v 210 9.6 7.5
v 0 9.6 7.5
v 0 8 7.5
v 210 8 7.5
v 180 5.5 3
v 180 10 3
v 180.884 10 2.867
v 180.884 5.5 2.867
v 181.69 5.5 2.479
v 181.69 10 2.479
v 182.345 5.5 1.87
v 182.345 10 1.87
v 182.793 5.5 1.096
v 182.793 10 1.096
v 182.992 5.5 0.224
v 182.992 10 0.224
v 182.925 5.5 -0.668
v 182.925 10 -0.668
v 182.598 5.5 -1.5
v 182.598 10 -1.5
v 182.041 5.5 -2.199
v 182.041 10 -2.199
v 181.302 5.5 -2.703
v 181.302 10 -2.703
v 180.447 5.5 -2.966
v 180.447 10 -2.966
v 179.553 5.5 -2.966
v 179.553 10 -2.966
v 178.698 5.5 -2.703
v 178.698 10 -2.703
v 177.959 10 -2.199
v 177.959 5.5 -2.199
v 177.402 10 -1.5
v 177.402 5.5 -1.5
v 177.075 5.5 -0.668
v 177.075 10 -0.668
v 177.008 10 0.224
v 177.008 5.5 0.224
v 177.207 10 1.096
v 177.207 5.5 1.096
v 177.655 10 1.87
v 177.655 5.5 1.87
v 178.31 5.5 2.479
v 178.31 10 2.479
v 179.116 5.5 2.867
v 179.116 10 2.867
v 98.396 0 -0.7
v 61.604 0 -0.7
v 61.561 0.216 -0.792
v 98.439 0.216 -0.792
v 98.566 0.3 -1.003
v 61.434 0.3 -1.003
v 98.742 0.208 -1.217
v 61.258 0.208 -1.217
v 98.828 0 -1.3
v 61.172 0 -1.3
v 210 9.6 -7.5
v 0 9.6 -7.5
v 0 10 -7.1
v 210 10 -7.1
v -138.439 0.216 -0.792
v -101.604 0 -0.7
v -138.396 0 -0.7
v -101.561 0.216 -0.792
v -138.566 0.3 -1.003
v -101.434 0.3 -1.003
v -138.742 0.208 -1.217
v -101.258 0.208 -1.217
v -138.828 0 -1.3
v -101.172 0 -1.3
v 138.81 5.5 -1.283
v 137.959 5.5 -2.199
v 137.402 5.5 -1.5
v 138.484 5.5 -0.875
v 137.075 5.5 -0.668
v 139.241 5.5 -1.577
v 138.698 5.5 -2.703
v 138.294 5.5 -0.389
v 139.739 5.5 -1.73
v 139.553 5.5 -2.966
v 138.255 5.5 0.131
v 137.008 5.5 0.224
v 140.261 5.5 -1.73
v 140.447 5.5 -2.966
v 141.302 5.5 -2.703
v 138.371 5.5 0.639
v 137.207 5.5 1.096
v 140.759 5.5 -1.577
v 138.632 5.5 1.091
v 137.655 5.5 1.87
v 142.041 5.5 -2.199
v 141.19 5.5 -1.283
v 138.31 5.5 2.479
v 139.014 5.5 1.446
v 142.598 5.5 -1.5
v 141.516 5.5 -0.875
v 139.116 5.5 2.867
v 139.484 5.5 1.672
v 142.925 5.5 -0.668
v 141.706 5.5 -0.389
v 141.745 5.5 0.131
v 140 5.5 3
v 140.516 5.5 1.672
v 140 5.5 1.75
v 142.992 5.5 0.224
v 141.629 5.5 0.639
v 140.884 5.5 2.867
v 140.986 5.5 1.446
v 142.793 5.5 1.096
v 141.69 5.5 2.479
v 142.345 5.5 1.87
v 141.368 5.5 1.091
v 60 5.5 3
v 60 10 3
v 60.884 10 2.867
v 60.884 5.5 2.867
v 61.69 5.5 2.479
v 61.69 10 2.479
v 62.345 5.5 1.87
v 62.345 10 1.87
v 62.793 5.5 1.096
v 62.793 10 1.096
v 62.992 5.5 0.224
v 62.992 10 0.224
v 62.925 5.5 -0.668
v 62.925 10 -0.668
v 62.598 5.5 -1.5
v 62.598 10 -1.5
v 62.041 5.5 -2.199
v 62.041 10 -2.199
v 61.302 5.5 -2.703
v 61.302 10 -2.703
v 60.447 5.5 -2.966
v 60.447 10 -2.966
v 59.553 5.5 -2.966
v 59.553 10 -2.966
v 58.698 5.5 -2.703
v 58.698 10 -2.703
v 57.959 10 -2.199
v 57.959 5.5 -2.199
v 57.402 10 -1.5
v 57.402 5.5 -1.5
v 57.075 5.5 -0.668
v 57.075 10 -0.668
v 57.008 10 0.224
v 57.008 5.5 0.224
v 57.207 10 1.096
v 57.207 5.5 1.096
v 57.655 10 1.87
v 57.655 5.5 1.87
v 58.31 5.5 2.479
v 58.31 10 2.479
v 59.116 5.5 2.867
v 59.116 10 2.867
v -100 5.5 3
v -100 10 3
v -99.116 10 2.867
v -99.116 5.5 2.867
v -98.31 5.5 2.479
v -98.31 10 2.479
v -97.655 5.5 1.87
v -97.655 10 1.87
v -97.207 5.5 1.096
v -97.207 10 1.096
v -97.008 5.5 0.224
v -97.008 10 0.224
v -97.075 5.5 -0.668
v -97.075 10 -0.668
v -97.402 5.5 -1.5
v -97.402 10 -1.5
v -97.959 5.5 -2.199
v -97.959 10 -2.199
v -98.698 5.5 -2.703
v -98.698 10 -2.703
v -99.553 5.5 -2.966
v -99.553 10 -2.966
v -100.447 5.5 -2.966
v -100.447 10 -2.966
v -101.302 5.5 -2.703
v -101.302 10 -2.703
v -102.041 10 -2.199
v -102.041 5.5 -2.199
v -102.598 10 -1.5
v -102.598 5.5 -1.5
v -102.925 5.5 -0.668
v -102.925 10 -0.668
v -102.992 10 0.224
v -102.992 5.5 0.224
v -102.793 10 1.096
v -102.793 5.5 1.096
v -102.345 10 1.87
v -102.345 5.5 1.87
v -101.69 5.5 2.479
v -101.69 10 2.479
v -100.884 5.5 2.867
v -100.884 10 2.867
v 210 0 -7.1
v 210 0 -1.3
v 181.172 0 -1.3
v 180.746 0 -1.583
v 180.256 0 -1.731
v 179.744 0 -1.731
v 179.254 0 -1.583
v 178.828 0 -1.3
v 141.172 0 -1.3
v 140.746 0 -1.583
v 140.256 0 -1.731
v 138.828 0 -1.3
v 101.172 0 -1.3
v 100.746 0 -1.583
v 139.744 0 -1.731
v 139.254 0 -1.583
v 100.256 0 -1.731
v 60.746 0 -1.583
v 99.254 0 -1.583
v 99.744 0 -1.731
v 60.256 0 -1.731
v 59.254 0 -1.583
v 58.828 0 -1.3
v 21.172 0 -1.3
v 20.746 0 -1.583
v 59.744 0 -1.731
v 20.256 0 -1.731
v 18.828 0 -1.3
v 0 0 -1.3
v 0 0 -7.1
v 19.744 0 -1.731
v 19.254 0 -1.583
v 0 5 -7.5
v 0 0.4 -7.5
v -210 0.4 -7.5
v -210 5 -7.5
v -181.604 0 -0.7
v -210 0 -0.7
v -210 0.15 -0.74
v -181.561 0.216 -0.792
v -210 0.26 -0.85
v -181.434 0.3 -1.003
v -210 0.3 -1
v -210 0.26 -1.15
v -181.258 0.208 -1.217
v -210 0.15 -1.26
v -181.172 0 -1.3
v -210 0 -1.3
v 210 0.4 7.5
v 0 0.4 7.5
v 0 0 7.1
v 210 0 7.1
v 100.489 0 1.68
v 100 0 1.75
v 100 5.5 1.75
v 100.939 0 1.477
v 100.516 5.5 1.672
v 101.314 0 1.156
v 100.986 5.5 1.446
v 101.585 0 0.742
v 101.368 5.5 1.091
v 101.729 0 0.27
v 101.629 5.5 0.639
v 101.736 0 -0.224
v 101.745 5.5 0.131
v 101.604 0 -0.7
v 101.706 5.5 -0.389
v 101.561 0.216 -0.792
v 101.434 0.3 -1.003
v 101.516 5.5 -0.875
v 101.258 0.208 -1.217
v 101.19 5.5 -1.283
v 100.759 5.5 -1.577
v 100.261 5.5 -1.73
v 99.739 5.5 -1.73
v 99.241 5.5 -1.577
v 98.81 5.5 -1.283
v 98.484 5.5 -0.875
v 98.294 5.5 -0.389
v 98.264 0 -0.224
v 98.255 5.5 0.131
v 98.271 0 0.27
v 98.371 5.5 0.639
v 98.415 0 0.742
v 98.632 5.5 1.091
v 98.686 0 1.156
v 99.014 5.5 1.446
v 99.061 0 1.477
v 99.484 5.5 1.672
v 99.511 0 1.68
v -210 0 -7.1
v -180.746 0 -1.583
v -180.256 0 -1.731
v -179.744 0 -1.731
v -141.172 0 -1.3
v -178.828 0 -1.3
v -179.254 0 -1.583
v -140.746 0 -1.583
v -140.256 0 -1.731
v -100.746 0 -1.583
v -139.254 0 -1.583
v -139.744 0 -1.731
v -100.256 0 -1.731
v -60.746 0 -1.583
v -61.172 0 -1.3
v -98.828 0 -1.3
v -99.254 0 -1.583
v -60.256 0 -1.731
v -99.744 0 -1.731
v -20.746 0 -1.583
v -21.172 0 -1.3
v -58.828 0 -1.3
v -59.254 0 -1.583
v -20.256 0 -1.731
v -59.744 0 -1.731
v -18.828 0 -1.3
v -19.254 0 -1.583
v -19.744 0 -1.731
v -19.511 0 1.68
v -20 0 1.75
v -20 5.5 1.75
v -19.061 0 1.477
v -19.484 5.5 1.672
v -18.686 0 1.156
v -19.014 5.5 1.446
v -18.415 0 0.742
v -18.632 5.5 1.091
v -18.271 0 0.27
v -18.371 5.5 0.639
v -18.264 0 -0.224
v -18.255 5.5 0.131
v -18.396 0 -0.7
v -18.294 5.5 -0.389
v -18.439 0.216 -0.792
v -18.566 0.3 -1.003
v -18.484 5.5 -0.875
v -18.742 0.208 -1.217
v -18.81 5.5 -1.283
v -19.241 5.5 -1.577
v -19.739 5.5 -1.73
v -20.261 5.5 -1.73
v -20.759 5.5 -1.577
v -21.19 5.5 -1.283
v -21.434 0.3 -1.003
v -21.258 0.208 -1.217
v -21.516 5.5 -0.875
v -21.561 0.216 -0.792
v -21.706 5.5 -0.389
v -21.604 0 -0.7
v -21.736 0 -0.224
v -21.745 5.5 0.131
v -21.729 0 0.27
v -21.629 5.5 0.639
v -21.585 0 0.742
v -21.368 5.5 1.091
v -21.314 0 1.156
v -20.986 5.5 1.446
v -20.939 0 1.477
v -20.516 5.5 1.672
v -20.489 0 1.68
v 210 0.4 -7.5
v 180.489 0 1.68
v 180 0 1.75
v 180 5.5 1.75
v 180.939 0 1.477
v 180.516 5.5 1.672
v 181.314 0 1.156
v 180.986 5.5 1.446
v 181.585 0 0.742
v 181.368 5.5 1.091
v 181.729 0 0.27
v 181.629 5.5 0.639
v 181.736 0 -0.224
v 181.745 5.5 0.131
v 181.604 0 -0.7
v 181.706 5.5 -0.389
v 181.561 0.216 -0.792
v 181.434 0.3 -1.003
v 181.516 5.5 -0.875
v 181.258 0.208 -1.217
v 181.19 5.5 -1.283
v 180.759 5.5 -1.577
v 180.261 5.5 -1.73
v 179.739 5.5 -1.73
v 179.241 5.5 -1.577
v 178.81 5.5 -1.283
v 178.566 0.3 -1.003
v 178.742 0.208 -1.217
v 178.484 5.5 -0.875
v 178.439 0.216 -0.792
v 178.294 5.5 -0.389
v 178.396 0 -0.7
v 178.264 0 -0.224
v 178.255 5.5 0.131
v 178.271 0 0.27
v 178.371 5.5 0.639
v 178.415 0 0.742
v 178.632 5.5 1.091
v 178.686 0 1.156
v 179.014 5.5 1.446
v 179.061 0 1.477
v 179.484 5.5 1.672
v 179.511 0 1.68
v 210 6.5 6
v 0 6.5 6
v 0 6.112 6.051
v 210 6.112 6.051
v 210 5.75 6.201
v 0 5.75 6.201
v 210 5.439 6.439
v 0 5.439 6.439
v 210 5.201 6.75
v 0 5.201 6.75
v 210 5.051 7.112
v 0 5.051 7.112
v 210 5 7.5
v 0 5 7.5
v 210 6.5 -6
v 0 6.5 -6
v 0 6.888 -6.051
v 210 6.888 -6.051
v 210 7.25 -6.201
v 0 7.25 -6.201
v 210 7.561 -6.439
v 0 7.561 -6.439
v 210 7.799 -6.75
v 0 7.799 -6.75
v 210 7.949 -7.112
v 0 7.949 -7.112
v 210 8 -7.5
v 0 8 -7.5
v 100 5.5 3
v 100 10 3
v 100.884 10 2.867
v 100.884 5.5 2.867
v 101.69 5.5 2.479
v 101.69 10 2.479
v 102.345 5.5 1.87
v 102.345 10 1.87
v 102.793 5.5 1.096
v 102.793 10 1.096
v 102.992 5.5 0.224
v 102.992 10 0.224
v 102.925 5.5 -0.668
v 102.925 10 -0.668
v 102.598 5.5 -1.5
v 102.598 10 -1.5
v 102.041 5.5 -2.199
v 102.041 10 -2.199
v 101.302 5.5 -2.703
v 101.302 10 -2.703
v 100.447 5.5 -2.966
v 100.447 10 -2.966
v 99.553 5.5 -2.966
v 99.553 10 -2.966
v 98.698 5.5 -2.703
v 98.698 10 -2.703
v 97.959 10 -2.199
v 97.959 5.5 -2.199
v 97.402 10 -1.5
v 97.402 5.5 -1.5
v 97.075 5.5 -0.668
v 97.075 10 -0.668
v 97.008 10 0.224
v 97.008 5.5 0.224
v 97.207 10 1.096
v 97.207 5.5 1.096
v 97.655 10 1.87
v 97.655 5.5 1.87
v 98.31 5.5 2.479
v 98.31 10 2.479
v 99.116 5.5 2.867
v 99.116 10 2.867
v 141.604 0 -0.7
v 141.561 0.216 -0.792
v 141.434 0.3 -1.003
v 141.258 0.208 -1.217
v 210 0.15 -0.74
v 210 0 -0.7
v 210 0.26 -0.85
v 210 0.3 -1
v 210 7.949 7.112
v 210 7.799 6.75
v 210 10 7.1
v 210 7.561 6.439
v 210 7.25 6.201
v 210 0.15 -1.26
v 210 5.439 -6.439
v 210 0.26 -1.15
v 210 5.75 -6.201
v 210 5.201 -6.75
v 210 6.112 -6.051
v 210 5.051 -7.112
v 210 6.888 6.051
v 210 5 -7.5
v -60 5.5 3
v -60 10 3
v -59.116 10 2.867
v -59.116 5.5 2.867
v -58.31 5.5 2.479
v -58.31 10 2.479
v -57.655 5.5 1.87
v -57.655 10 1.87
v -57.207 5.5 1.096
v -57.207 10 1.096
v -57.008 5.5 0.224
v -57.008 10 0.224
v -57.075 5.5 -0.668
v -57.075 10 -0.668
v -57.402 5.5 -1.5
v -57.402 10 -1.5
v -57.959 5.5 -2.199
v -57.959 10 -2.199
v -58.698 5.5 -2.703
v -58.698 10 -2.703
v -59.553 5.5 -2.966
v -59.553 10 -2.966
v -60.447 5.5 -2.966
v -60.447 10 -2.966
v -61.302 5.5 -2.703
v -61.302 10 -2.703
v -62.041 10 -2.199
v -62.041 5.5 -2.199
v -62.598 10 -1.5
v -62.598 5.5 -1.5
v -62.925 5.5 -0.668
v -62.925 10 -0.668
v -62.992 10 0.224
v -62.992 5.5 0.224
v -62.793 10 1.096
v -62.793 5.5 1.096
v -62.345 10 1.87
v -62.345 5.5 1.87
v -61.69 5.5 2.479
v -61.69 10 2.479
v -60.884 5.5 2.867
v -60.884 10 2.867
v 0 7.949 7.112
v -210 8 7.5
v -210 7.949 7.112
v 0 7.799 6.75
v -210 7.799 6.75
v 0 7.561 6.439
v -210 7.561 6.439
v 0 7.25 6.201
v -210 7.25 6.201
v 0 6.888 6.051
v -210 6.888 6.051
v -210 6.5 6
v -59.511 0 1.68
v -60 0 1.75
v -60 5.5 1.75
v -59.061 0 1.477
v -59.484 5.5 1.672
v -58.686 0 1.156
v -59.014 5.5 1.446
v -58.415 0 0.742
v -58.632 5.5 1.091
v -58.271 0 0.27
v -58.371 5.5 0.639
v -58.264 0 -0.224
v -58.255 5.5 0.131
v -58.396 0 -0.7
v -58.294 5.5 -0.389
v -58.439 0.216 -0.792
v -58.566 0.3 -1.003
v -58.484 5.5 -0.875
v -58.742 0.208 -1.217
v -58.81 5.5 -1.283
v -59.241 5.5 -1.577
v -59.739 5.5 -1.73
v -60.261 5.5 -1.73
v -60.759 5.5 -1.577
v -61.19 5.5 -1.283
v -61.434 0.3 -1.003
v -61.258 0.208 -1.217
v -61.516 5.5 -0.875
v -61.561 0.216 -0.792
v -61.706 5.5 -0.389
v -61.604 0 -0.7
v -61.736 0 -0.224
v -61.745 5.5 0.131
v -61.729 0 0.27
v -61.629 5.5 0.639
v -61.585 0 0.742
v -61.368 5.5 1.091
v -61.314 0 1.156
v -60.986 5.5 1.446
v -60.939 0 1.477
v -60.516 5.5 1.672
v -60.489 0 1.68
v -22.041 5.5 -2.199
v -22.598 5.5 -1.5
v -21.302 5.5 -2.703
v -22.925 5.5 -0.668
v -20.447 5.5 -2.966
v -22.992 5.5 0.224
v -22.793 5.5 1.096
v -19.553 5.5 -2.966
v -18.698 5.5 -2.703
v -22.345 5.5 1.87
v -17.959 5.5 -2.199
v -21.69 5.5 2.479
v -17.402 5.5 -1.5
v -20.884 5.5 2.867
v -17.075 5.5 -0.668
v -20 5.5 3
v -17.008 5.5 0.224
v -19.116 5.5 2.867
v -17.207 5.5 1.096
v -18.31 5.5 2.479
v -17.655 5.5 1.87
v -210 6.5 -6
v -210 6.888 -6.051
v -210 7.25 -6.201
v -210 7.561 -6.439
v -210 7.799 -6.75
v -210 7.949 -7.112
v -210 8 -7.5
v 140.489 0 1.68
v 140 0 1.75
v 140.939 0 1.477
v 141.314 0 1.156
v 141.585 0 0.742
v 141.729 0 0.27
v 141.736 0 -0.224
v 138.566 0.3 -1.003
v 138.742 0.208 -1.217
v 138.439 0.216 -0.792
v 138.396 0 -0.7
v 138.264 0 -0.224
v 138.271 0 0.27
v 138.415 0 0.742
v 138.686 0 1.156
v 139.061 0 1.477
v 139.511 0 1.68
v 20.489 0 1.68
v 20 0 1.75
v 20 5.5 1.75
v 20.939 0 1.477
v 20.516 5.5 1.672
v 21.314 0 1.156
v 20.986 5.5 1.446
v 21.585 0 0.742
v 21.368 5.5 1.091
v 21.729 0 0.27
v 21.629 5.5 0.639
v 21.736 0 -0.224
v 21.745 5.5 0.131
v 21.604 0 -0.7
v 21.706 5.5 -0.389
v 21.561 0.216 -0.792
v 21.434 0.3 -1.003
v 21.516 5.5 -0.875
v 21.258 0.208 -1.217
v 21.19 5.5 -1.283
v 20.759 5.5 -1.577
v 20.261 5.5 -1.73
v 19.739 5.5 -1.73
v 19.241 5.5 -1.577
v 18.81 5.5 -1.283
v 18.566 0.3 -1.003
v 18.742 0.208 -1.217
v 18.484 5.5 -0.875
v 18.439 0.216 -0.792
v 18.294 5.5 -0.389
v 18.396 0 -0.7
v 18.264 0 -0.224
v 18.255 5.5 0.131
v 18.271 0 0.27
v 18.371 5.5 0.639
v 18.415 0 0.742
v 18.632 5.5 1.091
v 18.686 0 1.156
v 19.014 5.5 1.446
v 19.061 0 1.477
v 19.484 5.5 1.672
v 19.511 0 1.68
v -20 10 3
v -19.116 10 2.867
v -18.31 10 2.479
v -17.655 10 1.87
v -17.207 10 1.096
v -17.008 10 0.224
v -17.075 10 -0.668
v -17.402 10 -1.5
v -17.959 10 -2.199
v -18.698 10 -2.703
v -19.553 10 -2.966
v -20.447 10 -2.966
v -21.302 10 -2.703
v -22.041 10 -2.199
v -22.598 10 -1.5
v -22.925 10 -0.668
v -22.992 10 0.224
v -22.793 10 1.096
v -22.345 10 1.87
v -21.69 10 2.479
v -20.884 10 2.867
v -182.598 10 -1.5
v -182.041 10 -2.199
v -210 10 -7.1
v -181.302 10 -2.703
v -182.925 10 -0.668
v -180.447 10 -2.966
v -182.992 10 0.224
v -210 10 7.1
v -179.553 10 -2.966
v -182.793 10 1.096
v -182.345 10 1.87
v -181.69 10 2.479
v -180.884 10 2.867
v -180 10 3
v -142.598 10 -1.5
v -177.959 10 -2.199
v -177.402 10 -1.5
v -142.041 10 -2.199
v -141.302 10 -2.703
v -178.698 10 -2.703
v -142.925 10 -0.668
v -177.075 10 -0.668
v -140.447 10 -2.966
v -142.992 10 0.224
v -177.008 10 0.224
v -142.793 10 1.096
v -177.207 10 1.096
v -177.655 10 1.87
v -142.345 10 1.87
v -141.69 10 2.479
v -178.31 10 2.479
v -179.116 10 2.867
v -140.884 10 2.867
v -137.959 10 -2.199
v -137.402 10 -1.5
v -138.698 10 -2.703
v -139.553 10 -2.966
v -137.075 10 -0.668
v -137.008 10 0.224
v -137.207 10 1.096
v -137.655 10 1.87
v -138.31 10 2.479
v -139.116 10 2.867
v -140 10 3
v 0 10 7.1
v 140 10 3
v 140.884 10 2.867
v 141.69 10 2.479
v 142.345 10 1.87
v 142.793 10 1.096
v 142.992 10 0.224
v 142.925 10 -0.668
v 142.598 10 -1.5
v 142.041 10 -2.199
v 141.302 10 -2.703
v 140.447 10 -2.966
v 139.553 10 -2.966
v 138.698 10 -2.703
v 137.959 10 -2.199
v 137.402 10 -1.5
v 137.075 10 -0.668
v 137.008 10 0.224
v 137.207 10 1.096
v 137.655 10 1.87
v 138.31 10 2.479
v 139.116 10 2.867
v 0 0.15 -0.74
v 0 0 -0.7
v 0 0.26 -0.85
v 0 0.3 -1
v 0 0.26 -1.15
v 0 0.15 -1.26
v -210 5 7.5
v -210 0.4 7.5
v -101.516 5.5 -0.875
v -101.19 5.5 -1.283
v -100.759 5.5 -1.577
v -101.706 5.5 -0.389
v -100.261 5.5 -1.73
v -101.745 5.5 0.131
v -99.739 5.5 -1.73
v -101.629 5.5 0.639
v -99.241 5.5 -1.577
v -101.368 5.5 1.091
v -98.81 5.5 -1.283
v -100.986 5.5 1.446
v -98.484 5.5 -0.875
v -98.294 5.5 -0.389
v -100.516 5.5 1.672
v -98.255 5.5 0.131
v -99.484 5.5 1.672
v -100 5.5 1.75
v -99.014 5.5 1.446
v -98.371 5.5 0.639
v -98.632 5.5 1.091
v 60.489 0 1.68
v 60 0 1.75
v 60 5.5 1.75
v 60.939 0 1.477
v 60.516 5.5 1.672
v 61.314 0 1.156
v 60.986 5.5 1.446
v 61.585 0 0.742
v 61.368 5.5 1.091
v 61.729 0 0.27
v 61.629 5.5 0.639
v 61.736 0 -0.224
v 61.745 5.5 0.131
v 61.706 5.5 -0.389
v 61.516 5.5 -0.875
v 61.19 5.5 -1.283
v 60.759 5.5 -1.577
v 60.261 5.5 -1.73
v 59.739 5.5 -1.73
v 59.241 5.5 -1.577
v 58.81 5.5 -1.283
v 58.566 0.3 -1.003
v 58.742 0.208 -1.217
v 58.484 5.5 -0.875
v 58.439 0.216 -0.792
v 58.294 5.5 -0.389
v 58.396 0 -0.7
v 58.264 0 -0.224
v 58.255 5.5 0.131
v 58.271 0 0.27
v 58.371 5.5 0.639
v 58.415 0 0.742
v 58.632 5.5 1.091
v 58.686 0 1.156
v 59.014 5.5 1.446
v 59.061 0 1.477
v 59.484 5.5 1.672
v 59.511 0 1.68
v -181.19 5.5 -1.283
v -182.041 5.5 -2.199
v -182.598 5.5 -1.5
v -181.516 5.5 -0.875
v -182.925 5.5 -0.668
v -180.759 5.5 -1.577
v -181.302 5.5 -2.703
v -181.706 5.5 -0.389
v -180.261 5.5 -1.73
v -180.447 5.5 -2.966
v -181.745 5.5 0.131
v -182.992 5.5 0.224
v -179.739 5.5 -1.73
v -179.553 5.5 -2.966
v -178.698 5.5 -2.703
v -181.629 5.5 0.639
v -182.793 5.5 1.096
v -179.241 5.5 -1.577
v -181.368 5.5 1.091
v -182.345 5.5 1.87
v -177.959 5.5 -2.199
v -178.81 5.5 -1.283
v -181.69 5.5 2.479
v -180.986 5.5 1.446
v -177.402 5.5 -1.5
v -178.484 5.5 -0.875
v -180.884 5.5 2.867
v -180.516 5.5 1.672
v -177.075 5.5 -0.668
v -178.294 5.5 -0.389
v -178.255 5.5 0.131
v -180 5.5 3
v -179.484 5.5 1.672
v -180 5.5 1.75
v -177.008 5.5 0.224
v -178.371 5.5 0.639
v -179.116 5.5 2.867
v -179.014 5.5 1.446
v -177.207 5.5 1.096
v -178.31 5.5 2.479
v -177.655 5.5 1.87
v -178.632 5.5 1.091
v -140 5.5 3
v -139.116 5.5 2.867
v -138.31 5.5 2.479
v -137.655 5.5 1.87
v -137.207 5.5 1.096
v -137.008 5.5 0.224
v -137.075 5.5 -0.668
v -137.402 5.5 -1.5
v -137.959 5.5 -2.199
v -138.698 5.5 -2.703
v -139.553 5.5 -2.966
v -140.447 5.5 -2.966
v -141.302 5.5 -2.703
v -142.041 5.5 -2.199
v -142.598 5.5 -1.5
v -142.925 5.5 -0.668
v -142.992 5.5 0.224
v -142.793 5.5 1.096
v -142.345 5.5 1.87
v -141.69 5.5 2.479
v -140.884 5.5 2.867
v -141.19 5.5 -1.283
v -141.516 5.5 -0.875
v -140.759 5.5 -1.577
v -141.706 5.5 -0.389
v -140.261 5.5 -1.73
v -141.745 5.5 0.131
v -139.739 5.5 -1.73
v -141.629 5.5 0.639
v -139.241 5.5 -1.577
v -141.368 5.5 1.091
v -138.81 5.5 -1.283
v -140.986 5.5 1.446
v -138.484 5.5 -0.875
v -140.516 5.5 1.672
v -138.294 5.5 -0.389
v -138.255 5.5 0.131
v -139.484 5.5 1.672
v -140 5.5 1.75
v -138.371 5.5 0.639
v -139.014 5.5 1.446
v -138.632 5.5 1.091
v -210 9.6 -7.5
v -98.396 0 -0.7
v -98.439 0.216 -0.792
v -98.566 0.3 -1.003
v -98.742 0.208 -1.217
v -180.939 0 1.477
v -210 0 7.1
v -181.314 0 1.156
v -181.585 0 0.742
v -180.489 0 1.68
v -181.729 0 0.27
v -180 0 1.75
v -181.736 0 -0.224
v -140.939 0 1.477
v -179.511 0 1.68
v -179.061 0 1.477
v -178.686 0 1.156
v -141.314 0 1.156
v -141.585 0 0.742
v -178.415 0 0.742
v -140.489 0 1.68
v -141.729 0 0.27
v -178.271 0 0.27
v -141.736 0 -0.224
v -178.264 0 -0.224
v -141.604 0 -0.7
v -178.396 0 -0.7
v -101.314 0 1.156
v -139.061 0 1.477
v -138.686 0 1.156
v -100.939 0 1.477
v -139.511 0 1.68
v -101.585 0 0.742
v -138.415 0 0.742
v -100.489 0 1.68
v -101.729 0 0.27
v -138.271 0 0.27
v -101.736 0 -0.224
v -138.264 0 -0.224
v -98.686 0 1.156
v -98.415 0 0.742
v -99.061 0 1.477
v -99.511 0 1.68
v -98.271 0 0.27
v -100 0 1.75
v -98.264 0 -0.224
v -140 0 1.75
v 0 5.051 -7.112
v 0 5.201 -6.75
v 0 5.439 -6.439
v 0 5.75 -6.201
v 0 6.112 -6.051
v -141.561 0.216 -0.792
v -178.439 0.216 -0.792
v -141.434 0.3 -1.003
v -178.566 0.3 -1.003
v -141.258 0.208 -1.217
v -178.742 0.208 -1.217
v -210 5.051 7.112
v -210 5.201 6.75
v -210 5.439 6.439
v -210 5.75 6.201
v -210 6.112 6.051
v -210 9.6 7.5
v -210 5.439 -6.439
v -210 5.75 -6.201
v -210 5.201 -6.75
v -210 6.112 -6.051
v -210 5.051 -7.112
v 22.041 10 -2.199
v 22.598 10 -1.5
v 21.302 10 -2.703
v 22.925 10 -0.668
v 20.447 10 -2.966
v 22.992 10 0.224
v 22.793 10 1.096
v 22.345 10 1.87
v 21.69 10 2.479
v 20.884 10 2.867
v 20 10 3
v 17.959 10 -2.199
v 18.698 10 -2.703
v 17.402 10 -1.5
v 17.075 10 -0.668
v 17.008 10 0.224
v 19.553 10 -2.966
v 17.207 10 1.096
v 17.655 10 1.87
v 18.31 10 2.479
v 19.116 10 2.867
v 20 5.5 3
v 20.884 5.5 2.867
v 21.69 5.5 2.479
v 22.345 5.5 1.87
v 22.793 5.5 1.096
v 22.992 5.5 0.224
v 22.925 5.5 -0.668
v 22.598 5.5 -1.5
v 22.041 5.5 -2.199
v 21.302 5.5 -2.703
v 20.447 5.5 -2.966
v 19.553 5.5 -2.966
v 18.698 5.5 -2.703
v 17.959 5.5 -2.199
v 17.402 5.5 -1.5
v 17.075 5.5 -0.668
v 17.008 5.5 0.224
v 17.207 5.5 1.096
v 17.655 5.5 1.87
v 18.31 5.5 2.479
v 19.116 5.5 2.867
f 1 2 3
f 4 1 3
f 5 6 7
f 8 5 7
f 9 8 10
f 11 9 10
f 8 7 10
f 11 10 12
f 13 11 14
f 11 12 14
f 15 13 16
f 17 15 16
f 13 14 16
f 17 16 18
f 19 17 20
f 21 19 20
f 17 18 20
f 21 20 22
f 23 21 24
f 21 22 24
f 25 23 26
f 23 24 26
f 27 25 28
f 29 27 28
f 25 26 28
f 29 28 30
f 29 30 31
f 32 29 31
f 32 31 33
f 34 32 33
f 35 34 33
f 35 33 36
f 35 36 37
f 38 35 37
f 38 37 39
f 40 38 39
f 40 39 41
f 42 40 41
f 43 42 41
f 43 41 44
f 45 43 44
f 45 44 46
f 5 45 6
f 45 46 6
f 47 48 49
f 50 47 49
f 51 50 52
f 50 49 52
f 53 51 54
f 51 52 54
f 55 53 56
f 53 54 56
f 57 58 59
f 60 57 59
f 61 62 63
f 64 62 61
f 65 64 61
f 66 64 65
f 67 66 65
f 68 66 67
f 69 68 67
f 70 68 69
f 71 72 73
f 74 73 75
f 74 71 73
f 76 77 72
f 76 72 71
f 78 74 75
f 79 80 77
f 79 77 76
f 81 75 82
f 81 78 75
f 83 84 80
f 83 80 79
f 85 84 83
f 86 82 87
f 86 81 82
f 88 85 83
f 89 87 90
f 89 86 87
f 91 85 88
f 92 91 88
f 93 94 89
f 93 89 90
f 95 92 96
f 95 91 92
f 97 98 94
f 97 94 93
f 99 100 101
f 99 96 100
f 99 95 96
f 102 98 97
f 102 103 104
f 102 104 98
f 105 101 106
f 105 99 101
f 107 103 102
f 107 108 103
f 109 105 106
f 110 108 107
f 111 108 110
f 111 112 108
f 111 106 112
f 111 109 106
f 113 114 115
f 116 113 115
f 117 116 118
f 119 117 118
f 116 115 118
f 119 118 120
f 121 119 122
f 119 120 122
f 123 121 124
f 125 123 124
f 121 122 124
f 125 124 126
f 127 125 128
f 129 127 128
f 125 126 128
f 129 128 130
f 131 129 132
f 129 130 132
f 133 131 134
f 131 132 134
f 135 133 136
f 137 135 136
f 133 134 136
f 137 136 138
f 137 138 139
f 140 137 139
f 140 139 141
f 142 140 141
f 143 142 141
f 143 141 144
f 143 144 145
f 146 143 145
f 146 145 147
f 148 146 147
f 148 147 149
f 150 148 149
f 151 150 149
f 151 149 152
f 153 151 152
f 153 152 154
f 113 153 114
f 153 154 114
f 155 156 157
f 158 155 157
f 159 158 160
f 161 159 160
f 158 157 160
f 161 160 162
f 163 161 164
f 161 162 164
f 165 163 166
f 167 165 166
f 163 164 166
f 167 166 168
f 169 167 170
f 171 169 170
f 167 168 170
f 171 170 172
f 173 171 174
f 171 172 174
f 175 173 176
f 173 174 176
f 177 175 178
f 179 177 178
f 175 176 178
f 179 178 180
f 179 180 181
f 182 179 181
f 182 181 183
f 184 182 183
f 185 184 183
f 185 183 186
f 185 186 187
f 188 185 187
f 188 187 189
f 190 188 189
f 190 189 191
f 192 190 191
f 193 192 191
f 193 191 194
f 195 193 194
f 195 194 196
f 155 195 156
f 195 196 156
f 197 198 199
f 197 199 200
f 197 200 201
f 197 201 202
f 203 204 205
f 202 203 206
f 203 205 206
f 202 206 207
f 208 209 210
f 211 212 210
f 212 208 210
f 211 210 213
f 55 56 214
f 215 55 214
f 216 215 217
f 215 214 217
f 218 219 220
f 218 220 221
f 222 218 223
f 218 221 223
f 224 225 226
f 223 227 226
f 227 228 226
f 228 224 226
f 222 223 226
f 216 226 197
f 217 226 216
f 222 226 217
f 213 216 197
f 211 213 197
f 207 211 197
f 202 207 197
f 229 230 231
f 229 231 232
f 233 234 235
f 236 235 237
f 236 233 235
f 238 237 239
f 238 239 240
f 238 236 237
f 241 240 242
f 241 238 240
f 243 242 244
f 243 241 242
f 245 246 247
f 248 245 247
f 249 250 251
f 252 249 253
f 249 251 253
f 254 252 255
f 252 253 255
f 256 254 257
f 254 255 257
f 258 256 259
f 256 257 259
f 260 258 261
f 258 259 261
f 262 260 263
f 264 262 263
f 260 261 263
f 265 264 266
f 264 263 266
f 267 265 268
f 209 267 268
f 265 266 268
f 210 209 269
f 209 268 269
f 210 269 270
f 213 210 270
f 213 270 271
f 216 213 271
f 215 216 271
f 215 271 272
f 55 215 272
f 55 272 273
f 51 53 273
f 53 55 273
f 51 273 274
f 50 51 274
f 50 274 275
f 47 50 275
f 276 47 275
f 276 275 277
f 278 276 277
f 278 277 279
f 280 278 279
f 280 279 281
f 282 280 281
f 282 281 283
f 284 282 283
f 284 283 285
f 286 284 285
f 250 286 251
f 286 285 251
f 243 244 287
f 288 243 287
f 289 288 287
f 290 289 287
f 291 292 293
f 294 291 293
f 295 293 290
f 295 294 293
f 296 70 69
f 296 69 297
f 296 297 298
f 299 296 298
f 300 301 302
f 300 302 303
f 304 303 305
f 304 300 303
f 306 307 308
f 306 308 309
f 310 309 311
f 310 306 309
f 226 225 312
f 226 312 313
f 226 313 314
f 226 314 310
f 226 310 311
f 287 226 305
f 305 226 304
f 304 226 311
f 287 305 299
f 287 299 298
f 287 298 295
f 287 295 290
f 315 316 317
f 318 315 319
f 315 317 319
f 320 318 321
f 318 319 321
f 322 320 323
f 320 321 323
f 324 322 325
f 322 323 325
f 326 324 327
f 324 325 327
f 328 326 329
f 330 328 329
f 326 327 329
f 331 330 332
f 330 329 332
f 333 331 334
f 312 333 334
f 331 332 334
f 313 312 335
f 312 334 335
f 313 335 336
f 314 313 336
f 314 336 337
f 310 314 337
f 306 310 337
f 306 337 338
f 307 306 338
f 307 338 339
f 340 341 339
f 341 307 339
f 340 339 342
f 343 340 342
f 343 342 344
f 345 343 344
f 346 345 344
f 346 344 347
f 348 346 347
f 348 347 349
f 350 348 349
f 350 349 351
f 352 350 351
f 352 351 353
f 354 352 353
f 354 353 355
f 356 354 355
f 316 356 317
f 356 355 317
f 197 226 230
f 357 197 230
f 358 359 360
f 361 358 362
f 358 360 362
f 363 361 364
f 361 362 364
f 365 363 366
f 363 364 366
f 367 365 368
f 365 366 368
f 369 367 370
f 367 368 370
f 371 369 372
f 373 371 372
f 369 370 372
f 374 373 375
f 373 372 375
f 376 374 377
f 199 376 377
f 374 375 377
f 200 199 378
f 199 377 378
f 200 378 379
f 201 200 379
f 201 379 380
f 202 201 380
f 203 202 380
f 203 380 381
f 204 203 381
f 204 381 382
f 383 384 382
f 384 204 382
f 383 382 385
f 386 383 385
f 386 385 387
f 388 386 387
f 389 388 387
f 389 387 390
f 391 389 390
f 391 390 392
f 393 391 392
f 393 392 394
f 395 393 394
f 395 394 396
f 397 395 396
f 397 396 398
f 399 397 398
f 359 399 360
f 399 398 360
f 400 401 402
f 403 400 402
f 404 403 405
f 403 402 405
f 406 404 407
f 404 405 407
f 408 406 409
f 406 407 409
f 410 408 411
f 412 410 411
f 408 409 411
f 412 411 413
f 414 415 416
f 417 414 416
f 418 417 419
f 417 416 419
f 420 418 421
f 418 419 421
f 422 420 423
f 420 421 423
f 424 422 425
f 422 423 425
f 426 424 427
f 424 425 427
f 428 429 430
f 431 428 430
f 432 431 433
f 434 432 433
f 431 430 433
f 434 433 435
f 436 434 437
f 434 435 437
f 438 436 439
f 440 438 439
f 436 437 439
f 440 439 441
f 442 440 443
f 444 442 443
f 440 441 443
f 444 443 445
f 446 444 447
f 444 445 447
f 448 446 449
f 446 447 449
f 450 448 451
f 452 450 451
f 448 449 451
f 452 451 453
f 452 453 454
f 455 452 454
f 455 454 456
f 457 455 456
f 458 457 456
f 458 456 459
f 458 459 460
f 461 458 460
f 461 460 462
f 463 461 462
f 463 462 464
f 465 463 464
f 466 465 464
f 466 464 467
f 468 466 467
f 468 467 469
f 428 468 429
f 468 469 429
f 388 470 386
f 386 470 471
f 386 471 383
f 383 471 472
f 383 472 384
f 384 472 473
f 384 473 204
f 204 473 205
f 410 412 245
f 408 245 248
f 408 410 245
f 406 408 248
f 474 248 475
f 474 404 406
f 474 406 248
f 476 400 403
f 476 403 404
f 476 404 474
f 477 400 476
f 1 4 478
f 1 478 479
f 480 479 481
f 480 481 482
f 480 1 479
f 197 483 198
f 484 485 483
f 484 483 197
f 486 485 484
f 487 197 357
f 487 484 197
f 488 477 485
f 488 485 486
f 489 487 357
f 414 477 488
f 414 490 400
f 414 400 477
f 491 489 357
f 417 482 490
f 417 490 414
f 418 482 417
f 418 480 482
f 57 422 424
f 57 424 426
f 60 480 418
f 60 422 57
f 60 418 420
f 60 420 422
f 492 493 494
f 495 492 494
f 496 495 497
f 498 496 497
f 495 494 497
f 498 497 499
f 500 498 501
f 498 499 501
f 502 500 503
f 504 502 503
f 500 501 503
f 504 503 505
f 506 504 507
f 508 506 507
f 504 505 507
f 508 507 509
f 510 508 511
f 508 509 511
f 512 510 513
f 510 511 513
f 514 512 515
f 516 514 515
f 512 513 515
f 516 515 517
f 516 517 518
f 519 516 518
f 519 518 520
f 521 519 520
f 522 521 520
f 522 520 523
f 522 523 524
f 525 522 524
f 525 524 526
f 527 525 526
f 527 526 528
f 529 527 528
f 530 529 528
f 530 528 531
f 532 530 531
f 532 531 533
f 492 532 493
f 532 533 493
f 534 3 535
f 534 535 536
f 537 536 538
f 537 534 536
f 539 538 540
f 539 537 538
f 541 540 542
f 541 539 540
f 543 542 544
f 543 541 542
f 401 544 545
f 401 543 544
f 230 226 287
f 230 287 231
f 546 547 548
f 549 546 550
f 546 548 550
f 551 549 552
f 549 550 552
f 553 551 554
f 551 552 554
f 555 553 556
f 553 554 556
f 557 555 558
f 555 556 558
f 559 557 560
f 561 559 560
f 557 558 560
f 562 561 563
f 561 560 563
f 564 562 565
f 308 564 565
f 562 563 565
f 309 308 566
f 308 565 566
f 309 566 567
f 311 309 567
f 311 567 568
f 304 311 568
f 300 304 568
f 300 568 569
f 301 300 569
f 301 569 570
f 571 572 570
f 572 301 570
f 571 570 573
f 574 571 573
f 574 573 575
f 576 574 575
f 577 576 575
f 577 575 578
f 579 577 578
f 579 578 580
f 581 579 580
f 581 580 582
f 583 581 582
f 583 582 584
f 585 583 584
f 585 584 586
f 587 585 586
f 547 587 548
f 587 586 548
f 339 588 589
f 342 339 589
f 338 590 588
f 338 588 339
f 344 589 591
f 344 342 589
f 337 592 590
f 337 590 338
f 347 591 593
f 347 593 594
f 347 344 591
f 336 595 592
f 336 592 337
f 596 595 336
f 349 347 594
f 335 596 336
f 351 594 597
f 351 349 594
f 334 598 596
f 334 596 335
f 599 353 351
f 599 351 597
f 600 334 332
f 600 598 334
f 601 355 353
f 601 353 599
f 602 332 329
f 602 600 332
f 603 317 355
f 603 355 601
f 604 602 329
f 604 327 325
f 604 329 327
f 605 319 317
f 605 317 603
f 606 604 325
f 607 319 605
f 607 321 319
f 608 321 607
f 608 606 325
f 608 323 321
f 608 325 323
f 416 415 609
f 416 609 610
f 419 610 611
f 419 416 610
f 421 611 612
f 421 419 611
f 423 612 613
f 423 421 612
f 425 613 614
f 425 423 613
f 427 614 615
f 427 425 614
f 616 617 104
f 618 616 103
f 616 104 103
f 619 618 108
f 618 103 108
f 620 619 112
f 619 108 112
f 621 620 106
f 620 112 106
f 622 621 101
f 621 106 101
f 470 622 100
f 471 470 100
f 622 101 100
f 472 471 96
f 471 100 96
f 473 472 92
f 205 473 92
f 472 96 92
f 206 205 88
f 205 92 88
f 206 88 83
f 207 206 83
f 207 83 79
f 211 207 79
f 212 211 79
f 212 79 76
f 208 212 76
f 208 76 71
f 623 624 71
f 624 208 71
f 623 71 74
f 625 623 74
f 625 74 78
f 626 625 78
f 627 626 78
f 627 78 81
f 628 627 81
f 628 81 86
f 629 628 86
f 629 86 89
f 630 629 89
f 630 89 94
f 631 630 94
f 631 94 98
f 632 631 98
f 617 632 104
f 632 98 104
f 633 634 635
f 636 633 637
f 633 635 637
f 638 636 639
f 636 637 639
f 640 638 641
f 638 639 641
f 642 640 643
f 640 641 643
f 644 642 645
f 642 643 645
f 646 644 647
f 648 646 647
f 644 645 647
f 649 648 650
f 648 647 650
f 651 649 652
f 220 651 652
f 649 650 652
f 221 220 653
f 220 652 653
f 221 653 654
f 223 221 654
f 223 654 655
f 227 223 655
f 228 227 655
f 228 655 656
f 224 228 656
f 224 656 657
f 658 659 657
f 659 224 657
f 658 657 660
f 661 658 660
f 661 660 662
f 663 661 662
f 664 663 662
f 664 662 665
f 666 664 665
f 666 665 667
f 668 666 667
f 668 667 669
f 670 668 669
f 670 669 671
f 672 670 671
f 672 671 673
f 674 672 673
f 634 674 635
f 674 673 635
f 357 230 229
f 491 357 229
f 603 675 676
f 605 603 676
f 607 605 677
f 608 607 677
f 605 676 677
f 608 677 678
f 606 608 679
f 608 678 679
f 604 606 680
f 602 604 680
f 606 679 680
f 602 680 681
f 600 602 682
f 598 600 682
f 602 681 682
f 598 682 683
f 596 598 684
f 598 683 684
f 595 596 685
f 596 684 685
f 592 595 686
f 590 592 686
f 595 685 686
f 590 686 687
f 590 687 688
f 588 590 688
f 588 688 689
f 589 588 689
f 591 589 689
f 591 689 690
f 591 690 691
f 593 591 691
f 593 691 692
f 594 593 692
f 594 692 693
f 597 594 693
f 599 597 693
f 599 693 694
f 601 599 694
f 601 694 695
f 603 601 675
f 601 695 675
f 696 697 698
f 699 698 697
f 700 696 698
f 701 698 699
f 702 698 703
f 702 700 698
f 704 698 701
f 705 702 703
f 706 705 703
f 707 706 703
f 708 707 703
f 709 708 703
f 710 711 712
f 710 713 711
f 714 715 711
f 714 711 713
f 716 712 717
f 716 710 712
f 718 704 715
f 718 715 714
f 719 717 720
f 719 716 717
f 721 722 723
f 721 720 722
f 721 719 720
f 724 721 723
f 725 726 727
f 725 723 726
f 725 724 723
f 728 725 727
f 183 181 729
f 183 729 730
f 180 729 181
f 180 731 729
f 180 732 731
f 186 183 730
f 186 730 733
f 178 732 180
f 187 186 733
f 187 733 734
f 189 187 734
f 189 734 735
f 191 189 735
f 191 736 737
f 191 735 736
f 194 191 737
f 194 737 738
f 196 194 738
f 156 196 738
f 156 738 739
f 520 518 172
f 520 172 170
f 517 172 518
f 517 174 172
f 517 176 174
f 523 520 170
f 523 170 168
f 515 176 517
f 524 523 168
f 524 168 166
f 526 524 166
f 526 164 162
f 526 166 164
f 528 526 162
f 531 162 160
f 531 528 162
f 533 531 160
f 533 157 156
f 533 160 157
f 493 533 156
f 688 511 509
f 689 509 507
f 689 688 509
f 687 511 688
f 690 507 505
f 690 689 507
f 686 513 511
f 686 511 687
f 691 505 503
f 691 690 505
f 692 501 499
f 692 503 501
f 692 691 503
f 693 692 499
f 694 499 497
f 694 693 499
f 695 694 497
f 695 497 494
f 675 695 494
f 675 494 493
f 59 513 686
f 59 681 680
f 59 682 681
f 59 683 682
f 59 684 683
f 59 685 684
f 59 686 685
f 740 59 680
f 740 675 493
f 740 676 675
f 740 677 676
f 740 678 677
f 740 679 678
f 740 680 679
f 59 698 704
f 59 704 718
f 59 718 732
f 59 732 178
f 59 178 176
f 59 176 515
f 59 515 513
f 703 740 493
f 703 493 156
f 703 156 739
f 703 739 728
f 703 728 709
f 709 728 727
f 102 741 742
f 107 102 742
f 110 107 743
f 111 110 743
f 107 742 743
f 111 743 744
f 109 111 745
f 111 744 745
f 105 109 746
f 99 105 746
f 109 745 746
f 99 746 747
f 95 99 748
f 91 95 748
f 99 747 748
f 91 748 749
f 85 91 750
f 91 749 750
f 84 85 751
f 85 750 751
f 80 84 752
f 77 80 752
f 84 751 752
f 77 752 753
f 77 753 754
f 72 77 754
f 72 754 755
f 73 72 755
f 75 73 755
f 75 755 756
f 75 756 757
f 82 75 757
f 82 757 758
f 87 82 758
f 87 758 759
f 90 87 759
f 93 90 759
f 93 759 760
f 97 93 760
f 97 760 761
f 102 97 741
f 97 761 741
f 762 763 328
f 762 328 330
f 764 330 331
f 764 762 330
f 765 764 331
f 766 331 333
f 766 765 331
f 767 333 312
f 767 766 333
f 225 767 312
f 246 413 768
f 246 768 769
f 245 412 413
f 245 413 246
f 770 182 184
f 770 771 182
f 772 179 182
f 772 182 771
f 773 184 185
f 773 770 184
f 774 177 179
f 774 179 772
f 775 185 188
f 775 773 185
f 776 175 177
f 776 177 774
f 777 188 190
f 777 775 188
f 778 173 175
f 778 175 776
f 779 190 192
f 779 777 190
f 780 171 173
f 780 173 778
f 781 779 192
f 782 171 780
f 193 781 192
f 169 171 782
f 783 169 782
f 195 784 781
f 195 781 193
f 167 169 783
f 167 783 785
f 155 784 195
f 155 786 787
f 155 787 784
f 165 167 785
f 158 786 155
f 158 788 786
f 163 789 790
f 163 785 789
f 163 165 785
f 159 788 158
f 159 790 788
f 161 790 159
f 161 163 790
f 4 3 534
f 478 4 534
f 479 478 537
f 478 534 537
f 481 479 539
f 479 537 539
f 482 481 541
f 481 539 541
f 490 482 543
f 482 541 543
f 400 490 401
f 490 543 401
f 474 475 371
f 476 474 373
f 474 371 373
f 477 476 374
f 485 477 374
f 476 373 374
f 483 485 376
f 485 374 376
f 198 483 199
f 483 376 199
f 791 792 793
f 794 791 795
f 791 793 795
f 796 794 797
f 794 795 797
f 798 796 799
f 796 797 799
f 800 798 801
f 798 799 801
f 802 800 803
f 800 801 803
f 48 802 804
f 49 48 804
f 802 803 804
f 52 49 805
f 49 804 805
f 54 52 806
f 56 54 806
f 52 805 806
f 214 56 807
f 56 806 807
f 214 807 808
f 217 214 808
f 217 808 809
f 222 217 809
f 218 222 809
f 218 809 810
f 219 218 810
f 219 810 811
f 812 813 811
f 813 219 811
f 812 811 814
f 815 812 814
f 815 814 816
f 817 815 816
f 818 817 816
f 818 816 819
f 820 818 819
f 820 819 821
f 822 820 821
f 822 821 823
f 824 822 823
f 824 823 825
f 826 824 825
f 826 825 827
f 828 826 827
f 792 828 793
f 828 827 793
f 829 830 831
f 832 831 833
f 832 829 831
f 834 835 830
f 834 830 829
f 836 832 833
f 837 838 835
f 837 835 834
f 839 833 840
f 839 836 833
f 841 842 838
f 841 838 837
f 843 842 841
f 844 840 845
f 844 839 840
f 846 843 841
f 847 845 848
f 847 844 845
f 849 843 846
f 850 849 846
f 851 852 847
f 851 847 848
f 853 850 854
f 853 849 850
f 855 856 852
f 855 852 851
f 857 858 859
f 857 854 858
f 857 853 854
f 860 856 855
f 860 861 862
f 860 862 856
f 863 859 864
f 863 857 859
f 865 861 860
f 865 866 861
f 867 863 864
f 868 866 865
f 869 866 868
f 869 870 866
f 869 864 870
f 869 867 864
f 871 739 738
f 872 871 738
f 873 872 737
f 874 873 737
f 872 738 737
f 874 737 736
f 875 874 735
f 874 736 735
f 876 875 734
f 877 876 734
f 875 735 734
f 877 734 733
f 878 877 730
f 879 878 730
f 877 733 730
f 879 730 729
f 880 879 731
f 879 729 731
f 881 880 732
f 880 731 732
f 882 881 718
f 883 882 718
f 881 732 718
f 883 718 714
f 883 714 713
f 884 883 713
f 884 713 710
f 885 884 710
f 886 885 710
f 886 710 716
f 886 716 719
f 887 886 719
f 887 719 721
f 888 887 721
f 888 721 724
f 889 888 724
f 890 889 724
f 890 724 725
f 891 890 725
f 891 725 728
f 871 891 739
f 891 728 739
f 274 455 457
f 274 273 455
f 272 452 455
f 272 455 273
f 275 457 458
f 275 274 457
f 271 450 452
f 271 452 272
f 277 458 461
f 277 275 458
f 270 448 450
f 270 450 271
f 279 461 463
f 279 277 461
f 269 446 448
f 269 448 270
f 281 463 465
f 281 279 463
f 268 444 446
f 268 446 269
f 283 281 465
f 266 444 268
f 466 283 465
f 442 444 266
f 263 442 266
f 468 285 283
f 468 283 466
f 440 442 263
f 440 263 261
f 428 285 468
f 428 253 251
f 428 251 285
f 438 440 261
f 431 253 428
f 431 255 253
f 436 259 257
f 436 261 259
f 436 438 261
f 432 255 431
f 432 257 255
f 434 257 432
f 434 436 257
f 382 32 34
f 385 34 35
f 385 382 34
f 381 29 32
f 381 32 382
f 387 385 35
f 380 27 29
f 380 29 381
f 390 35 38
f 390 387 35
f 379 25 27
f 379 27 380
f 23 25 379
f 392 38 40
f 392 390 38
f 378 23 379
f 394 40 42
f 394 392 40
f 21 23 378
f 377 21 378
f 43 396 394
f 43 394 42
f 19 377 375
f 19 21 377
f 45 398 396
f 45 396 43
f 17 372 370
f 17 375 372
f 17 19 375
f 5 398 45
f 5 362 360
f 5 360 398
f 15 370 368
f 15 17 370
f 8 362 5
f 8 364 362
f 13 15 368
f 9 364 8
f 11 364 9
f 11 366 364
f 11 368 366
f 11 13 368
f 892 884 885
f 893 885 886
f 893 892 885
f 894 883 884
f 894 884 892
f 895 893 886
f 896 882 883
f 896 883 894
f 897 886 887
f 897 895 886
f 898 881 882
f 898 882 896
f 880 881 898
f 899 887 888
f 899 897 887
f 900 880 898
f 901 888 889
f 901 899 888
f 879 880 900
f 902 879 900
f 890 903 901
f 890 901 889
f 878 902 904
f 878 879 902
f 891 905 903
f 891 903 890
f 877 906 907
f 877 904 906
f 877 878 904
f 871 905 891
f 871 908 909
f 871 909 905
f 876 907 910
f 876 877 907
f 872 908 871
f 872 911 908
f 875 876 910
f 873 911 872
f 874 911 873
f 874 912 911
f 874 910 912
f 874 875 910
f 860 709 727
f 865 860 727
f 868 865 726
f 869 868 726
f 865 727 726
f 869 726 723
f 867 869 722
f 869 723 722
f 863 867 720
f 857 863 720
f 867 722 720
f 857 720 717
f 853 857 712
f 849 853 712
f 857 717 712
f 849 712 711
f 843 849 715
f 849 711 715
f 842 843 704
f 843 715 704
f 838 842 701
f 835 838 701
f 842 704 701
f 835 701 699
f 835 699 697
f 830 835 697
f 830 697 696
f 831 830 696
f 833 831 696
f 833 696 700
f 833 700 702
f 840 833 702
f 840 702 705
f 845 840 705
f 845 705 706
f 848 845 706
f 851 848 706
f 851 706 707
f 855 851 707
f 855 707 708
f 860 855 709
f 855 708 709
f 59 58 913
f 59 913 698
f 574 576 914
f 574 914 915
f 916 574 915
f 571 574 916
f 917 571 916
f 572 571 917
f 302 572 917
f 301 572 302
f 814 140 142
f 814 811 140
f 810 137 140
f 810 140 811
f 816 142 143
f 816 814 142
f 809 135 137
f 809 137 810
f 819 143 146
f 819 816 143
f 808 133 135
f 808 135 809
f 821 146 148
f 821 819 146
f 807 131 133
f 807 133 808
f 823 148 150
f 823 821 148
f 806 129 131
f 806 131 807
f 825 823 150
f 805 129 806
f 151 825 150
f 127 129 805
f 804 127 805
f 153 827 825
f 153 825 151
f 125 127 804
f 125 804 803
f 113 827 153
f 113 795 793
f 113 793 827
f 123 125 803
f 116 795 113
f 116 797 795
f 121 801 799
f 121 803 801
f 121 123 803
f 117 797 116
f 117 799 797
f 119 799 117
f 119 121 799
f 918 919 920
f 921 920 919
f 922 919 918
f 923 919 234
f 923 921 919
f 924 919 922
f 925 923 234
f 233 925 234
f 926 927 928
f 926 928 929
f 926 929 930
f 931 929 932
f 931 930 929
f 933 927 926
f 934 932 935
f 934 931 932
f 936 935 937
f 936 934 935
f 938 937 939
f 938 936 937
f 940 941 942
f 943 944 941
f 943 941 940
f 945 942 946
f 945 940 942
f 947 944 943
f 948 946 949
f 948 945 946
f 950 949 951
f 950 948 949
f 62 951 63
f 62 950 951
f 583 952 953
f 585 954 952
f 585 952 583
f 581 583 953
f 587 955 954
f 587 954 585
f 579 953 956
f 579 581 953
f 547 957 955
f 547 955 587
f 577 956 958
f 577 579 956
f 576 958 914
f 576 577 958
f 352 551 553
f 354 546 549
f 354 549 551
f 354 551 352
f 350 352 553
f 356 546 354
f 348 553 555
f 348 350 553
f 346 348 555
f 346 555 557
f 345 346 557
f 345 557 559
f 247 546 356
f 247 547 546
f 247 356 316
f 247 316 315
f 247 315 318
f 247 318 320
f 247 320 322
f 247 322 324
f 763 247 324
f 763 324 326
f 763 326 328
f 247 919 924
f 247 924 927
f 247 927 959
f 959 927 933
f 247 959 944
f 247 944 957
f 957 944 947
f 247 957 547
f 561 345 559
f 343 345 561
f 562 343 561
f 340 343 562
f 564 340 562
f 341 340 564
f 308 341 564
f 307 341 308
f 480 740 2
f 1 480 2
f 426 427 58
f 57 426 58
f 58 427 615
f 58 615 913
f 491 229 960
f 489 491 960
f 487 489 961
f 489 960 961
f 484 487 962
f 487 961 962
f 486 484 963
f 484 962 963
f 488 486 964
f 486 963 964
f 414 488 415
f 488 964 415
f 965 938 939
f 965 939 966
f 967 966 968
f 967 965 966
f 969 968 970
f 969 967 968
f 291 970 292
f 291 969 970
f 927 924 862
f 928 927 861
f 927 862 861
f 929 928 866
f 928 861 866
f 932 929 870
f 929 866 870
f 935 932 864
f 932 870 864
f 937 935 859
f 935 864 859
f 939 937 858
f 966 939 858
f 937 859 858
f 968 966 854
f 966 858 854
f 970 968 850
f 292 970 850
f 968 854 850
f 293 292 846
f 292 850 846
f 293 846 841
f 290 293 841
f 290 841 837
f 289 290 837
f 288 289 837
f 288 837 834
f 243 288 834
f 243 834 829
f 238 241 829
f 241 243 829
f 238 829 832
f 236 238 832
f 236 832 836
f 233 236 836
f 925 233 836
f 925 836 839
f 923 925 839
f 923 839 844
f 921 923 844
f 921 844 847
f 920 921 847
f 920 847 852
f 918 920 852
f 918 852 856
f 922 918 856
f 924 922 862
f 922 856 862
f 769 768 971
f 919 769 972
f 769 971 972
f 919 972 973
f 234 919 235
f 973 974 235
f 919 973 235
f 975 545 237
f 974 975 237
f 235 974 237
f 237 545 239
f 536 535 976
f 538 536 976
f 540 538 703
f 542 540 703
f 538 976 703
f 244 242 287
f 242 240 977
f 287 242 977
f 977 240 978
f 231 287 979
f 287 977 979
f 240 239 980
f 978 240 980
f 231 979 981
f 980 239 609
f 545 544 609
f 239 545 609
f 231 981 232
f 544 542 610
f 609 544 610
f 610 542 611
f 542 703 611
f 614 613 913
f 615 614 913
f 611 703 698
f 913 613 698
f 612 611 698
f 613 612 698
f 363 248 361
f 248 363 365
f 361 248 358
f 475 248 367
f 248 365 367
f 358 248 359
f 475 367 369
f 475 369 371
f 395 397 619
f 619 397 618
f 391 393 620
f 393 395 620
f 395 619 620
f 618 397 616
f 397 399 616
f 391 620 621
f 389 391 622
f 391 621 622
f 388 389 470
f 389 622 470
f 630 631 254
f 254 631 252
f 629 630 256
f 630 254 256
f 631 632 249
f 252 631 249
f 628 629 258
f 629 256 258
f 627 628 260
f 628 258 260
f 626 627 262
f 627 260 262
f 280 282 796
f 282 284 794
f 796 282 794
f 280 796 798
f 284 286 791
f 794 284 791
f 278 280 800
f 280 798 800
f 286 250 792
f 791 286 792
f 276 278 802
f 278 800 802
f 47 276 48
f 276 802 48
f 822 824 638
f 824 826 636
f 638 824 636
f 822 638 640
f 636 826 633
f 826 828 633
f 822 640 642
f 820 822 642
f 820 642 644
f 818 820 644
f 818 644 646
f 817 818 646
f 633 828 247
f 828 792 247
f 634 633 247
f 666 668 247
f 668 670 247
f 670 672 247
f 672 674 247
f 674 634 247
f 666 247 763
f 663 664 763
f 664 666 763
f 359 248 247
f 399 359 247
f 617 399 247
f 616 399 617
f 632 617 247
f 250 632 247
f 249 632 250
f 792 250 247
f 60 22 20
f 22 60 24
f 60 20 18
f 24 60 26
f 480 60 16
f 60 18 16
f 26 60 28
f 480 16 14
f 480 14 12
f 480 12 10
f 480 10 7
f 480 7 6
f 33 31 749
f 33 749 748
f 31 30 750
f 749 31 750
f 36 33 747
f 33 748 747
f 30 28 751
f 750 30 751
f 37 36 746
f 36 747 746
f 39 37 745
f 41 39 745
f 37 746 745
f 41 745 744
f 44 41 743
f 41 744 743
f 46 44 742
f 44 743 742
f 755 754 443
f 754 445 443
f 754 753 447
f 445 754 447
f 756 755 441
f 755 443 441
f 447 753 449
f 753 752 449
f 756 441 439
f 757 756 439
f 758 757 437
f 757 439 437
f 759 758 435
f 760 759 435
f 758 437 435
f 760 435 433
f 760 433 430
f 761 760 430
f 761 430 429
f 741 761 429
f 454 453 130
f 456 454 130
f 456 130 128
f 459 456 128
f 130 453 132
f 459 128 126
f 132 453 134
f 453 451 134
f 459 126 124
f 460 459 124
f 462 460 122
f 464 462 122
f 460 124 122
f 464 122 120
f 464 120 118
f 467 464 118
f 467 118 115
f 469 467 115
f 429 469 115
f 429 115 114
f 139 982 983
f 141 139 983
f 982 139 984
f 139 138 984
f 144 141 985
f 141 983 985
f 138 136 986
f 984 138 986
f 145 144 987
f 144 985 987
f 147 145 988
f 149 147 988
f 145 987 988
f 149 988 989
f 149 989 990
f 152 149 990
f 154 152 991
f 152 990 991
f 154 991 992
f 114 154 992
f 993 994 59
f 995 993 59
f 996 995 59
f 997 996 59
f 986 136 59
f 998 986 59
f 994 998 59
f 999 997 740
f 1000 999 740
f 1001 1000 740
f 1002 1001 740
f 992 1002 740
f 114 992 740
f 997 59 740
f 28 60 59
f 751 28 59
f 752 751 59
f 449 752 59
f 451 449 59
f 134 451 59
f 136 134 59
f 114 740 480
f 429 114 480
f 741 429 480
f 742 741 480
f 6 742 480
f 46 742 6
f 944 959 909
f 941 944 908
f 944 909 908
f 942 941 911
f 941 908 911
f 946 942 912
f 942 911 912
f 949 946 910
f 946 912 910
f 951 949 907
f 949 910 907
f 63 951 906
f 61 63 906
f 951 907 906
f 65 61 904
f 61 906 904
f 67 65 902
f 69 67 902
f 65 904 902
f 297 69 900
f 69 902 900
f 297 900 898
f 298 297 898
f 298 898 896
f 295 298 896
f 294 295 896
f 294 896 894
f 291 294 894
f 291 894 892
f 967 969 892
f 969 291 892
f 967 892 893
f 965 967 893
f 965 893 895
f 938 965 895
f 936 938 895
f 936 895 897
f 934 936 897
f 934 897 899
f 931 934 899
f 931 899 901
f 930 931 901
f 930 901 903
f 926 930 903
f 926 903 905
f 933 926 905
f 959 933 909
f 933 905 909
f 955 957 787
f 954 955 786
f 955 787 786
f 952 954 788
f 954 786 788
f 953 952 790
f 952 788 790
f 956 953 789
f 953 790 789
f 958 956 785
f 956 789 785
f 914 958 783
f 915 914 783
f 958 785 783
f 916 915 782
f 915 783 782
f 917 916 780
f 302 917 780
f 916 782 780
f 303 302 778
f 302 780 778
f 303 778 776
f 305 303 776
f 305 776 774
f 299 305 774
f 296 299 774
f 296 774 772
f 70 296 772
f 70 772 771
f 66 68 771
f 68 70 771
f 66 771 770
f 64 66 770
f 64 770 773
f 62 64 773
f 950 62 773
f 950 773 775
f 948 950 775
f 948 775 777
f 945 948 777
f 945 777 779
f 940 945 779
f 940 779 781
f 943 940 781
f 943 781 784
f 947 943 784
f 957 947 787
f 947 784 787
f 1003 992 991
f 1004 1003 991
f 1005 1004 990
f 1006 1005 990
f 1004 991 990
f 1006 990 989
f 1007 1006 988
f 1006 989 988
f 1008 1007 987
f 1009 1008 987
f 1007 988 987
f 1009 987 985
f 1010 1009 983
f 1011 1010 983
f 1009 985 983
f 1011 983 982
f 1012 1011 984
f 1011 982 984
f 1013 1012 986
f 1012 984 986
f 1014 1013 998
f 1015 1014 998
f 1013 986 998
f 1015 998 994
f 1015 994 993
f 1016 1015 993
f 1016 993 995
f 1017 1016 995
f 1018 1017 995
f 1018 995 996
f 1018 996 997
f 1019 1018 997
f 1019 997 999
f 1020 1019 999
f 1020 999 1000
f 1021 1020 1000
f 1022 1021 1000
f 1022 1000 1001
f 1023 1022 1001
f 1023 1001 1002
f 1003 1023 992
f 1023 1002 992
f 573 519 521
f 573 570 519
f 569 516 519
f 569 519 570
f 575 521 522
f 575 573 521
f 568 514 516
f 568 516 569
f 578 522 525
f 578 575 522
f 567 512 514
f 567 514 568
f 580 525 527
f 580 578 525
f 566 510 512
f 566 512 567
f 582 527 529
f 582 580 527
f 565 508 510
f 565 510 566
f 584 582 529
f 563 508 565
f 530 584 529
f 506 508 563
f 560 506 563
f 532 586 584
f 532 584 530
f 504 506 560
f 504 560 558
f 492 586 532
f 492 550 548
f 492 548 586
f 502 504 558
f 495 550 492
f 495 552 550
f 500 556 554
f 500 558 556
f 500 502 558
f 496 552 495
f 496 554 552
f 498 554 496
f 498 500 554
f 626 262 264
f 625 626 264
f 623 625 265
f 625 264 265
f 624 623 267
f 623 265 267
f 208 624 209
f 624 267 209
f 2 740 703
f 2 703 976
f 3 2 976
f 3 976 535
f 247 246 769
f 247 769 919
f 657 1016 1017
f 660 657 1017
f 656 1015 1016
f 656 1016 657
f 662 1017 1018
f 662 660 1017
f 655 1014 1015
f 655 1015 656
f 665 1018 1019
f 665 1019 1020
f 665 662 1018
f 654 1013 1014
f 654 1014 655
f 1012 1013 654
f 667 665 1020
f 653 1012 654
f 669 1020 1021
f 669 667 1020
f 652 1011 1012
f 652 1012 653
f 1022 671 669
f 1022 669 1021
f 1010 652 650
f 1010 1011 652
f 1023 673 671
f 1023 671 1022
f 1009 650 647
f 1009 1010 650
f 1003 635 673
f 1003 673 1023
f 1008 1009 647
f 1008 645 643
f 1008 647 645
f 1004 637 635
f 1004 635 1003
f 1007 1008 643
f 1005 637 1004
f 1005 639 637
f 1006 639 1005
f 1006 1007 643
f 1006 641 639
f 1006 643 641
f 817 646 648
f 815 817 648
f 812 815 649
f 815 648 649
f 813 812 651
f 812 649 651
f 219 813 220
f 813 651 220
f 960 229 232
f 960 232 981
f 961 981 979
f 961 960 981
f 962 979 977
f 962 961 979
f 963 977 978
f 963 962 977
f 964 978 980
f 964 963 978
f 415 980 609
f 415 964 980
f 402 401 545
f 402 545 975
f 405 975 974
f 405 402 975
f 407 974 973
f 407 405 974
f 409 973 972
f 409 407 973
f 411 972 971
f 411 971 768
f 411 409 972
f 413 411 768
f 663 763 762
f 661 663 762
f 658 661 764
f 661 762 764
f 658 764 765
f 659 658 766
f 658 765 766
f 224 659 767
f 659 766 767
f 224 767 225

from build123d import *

# Parameters (mm, degrees)
EXTRUDE_1_DEPTH        = 210
SKETCH_2_R             = 3
CUT_EXTRUDE_1_DEPTH    = 4.5
SKETCH_4_R             = 1.75
CUT_EXTRUDE_2_DEPTH    = 211.205851488
PATTERN_LINEAR_1_COUNT = 15
PATTERN_LINEAR_1_PITCH = 40


with BuildPart() as part:
    # 草图1 → 凸台-拉伸1 (new, symmetric)
    with BuildSketch(Plane(origin=(0, 0, 0), x_dir=(0, 0, -1), z_dir=(1, 0, 0))):
        with BuildLine():
            Line((-7.5, 5), (-7.5, 0.4))
            Line((-7.5, 0.4), (-7.1, 0))
            Line((-7.1, 0), (0.7, 0))
            ThreePointArc((0.7, 0), (1, 0.3), (1.3, 0))
            Line((1.3, 0), (7.1, 0))
            Line((7.1, 0), (7.5, 0.4))
            Line((7.5, 0.4), (7.5, 5))
            ThreePointArc((7.5, 5), (6.439339828, 5.439339828), (6, 6.5))
            ThreePointArc((6, 6.5), (6.439339828, 7.560660172), (7.5, 8))
            Line((7.5, 8), (7.5, 9.6))
            Line((7.5, 9.6), (7.1, 10))
            Line((7.1, 10), (-7.1, 10))
            Line((-7.1, 10), (-7.5, 9.6))
            Line((-7.5, 9.6), (-7.5, 8))
            ThreePointArc((-7.5, 8), (-6.439339823, 7.560660166), (-6, 6.499999984))
            ThreePointArc((-6, 6.499999984), (-6.439339834, 5.439339823), (-7.5, 5))
        make_face()
    extrude(amount=EXTRUDE_1_DEPTH, both=True)

    # 草图2 → 切除-拉伸1 (cut)
    with BuildSketch(Plane(origin=(0, 10, 0), x_dir=(1, 0, 0), z_dir=(0, 1, 0))):
        with Locations(Location((-180, 0, 0), (0, 0, 270))):
            Circle(SKETCH_2_R)
    cut_extrude_1 = extrude(amount=-CUT_EXTRUDE_1_DEPTH, mode=Mode.SUBTRACT)

    # 草图4 → 切除-拉伸2 (cut, through all)
    with BuildSketch(Plane(origin=(0, 5.5, 0), x_dir=(1, 0, 0), z_dir=(0, 1, 0))):
        with Locations(Location((-180, 0, 0), (0, 0, 270))):
            Circle(SKETCH_4_R)
    cut_extrude_2 = extrude(amount=-CUT_EXTRUDE_2_DEPTH, mode=Mode.SUBTRACT)

    # 阵列(线性)1: 切除-拉伸1, 切除-拉伸2 ×15
    with Locations(*[(i * PATTERN_LINEAR_1_PITCH, 0, 0) for i in range(1, PATTERN_LINEAR_1_COUNT)]):
        add(cut_extrude_1, mode=Mode.SUBTRACT)
        add(cut_extrude_2, mode=Mode.SUBTRACT)


solid = part.part
